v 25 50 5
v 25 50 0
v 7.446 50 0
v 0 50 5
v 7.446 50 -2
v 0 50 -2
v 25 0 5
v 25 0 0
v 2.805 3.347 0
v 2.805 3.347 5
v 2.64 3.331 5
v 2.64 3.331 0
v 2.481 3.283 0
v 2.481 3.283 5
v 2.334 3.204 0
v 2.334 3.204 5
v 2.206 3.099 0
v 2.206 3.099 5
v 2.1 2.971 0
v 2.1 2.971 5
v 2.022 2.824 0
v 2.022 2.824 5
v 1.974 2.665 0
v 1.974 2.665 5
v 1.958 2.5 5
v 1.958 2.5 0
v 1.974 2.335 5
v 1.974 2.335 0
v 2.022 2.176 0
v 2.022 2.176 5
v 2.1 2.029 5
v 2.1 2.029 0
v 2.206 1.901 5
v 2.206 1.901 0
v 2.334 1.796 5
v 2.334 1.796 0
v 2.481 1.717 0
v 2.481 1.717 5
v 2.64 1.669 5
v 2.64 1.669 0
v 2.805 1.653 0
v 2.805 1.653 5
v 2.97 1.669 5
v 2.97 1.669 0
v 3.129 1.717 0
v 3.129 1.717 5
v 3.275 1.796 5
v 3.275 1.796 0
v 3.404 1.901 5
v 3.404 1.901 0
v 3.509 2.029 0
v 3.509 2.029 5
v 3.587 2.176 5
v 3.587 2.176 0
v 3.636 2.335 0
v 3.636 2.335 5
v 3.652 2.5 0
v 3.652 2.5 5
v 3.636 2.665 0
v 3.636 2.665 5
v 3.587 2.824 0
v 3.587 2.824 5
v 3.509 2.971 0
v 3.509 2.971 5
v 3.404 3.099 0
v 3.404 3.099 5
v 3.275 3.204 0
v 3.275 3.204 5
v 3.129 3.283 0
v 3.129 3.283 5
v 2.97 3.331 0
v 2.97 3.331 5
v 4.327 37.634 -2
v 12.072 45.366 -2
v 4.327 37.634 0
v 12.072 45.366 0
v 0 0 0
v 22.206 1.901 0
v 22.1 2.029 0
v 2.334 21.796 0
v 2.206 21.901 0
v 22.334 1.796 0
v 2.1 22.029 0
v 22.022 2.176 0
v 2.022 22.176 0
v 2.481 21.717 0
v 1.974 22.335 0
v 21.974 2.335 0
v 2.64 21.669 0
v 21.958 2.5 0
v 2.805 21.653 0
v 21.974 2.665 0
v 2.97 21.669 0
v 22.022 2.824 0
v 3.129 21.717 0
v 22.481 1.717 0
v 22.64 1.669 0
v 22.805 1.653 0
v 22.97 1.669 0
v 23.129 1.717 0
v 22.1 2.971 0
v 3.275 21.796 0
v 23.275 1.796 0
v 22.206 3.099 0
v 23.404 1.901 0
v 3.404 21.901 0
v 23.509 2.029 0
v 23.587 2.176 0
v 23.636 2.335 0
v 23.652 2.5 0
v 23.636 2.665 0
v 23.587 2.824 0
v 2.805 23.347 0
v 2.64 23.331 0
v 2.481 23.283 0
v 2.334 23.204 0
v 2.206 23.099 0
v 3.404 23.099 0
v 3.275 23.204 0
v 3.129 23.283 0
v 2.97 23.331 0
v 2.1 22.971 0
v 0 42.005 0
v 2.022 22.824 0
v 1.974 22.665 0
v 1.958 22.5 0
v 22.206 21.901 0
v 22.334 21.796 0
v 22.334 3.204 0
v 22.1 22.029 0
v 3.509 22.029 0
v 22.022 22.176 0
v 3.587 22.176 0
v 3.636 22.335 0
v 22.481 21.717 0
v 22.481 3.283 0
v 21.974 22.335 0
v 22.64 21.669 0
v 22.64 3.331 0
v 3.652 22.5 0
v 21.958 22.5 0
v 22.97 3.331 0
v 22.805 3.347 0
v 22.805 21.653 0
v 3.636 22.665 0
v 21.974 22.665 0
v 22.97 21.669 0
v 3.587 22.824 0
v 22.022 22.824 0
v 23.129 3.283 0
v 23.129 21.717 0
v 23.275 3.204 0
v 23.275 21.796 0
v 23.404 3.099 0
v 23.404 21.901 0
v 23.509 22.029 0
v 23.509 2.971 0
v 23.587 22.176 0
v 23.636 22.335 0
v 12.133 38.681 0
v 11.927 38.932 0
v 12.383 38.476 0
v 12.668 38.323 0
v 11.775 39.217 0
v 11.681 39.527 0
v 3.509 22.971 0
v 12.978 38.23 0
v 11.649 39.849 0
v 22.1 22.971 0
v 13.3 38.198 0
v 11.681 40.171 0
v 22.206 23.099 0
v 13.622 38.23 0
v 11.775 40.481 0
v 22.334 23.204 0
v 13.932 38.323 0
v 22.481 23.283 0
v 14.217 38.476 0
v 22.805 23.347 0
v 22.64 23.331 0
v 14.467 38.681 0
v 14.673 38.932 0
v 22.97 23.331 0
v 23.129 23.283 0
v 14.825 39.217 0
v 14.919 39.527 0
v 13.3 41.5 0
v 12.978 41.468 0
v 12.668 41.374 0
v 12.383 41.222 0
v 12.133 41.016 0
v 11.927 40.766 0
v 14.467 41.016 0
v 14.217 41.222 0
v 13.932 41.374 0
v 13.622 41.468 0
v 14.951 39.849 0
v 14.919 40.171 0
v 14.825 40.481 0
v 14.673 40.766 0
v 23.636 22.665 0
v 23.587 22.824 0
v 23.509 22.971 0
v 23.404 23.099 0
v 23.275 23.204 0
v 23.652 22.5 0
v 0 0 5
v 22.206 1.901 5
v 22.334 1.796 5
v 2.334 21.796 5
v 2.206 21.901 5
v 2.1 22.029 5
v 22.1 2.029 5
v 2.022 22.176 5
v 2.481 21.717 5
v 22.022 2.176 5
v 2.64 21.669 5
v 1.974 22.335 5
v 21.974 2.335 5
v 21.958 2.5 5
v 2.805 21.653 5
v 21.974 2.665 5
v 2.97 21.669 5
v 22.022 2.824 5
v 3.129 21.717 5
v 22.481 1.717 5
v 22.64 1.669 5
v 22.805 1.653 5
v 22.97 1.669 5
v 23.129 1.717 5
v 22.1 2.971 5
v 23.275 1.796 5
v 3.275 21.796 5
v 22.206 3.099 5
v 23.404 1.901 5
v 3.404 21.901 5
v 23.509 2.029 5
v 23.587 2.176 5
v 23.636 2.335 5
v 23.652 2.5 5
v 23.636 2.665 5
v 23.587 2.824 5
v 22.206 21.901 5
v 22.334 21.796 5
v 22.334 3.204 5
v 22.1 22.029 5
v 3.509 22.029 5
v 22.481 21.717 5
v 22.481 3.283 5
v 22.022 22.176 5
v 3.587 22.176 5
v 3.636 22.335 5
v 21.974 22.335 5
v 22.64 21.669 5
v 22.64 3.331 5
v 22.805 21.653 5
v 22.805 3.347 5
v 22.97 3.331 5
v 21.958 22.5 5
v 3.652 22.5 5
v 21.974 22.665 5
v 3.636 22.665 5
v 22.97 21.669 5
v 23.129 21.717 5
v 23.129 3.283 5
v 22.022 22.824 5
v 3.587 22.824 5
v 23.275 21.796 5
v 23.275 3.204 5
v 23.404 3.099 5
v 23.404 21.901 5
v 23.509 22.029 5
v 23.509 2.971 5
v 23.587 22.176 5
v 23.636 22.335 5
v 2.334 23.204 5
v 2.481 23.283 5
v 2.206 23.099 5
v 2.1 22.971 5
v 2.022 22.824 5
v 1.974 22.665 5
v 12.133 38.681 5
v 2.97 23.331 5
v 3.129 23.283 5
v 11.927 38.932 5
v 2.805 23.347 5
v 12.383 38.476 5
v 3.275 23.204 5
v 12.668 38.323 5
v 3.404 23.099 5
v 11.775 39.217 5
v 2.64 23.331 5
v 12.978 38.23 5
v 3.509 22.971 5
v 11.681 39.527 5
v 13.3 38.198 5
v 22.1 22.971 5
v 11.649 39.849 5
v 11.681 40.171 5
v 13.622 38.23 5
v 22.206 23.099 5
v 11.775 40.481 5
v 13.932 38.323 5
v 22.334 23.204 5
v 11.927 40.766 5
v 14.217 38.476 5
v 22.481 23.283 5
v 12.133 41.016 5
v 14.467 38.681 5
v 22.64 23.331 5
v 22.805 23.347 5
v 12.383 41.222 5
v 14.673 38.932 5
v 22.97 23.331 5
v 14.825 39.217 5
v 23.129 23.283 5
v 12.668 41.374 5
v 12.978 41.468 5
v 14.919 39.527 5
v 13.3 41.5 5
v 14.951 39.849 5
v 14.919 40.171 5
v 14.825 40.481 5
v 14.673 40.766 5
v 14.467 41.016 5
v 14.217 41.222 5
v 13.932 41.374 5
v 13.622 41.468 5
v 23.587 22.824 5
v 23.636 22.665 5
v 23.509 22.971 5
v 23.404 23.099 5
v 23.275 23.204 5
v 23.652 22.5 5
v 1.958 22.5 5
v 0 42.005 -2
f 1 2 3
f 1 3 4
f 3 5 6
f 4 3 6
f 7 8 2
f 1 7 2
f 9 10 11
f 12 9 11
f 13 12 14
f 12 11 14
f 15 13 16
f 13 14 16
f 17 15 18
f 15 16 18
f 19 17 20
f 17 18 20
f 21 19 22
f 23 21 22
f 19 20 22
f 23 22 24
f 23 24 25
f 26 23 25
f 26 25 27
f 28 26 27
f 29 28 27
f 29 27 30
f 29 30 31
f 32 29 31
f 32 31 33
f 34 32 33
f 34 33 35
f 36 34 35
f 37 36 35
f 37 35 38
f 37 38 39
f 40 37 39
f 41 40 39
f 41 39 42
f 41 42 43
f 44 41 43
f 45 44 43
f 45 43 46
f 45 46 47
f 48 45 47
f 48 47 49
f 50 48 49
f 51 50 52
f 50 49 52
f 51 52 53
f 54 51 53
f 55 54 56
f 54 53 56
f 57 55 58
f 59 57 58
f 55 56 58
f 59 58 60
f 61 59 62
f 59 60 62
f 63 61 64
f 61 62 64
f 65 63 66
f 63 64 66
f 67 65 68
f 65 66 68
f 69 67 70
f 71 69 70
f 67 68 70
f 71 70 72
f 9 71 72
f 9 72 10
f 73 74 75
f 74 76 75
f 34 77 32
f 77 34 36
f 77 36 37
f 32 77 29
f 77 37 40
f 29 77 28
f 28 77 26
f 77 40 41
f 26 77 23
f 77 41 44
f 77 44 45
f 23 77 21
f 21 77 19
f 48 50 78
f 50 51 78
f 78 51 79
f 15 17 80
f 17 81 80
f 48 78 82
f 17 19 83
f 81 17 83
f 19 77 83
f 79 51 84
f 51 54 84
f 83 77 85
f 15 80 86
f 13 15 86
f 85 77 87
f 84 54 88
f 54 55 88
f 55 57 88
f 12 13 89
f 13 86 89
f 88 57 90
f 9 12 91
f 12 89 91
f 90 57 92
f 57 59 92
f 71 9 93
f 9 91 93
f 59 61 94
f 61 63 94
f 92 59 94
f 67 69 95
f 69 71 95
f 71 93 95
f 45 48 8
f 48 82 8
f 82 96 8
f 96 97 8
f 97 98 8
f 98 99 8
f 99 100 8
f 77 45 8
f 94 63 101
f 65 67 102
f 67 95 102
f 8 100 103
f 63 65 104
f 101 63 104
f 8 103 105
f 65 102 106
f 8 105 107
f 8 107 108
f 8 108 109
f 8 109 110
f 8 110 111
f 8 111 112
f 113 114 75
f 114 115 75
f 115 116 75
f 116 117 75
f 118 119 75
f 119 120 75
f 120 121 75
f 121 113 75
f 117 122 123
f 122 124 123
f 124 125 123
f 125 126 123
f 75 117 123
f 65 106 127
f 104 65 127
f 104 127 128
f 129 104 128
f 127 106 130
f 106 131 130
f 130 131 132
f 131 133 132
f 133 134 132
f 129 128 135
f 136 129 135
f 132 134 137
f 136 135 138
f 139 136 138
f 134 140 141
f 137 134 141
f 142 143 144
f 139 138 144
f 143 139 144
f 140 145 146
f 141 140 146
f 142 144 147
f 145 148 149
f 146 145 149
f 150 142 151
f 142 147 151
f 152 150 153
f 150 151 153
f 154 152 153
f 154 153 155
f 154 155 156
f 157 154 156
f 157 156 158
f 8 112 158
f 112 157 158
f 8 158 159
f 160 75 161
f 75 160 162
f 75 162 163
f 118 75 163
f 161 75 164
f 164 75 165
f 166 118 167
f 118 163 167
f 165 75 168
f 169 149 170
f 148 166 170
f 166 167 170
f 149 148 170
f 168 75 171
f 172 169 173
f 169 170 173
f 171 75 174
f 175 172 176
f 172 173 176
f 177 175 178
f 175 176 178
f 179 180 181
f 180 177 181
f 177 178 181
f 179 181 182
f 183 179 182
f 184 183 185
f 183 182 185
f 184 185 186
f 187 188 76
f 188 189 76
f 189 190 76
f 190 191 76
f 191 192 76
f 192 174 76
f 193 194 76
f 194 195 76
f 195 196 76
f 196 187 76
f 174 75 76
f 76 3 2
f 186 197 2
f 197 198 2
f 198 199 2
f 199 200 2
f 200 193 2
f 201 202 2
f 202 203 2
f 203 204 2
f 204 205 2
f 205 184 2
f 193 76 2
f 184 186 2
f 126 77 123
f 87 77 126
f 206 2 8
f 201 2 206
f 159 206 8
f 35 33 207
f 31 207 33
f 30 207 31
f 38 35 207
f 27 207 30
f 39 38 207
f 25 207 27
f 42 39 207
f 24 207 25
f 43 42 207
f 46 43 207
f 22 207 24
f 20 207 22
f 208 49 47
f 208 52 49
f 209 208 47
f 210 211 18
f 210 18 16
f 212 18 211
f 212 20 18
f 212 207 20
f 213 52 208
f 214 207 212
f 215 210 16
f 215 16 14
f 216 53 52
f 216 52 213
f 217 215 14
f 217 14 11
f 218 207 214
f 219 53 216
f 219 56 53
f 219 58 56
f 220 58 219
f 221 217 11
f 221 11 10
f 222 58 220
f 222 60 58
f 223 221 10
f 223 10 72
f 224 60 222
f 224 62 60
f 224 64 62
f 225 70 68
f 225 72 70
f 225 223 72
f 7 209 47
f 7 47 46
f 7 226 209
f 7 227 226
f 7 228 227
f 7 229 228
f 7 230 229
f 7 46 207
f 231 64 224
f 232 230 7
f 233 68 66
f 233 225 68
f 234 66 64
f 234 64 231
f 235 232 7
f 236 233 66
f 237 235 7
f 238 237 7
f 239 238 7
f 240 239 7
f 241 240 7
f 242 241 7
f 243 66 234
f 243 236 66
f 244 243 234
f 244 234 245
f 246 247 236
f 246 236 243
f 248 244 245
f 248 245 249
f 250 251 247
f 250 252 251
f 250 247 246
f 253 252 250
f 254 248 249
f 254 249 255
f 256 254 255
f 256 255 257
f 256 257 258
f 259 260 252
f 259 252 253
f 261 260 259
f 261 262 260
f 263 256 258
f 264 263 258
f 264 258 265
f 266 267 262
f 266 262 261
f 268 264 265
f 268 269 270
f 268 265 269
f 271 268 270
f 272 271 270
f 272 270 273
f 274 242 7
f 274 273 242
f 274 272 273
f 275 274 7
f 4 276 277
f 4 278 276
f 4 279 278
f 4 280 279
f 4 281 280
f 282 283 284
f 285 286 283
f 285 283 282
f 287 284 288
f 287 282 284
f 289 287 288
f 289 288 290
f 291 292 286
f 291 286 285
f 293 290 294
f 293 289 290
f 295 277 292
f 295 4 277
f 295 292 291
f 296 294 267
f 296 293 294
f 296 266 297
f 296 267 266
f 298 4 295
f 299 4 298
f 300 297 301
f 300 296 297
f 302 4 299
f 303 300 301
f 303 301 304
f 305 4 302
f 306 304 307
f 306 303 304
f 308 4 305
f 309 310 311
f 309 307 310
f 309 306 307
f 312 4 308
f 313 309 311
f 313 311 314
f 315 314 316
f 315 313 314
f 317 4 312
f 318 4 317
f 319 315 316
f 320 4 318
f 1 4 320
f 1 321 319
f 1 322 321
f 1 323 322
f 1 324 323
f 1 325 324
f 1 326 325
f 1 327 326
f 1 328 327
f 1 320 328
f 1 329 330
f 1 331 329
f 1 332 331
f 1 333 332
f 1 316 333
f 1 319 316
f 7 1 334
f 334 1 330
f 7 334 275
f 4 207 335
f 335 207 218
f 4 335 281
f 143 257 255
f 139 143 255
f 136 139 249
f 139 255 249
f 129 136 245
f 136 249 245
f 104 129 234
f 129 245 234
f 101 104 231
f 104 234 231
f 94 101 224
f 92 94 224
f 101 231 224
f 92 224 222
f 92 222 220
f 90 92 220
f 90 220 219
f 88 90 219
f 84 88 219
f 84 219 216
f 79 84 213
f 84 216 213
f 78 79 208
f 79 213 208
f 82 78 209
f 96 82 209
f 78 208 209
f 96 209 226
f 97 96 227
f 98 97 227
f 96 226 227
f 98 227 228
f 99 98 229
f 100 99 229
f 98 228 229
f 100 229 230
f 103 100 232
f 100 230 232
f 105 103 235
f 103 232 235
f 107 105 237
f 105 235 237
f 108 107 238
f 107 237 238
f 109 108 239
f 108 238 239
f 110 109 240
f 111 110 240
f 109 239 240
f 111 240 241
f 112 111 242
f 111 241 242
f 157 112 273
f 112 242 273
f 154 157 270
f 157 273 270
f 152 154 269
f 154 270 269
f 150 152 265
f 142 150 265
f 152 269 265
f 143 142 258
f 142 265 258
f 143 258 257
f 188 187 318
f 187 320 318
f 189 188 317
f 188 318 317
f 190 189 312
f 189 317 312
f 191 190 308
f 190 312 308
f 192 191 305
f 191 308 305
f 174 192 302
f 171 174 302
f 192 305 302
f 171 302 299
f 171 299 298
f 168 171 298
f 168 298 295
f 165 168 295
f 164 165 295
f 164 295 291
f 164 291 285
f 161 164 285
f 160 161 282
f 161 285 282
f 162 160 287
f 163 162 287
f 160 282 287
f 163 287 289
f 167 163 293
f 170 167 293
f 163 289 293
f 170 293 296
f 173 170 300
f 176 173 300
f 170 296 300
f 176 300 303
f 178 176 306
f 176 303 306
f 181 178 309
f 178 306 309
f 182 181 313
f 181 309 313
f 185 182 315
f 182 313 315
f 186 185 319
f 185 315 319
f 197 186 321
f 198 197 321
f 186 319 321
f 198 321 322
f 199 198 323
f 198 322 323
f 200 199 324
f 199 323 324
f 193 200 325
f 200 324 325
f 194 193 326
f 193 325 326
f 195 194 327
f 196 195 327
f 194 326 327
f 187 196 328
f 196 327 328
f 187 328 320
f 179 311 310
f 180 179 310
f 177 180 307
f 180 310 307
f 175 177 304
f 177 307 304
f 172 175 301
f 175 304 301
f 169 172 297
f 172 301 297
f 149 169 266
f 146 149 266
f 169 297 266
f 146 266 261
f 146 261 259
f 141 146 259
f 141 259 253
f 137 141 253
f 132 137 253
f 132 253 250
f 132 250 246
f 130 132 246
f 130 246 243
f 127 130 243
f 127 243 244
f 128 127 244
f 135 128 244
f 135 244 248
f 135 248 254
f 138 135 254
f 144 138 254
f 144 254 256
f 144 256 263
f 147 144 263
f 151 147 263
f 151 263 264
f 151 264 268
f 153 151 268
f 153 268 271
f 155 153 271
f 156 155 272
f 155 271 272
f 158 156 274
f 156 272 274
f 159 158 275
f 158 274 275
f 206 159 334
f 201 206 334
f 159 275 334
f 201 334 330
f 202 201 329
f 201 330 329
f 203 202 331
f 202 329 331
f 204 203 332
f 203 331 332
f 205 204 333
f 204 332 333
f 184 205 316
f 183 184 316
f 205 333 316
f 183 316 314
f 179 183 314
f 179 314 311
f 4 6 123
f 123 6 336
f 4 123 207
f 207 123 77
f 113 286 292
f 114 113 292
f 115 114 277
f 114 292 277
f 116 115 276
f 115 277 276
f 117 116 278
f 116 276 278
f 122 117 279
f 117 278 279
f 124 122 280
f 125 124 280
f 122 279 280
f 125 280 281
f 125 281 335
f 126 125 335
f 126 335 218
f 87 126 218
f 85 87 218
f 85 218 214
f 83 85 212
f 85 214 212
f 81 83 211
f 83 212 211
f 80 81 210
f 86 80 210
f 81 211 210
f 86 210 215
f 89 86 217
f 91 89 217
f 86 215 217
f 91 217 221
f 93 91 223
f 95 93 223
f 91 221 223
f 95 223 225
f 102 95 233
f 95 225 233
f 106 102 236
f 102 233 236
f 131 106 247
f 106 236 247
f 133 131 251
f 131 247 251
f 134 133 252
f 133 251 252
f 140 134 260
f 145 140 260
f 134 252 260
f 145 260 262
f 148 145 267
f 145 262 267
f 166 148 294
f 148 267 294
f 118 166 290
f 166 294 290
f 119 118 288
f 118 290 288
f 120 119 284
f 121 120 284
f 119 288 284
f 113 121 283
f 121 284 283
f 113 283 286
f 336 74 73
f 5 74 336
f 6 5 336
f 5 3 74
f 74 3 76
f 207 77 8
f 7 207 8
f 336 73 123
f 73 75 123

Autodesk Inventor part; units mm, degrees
ref_plane "YZ Plane" through (0, 0, 0) normal (1, 0, 0) x (0, 1, 0)
ref_plane "XZ Plane" through (0, 0, 0) normal (0, 1, 0) x (-1, 0, 0)
ref_plane "XY Plane" through (0, 0, 0) normal (0, 0, 1) x (1, 0, 0)
sketch "Sketch1" plane through (0, 0, 0) normal (0, 0, 1) x (1, 0, 0)
  line L0 (0, 0) -> (25, 0)
  line L1 (25, 0) -> (25, 50)
  line L2 (25, 50) -> (0, 50)
  line L3 (0, 50) -> (0, 0)
  dimension "d0" = 50
  dimension "d1" = 25
extrude "Extrusion1" add sketch "Sketch1" along normal blind 5
sketch "Sketch7" plane through (0, 0, 0) normal (0, 0, -1) x (-1, 0, 0)
  line L0 (0, 0) -> (-25, 0) projected
  line L1 (0, 50) -> (0, 0) projected
  line L2 (-25, 50) -> (0, 50) projected
  line L3 (-25, 0) -> (-25, 50) projected
  line L4 (-26.9321, 31.3954) -> (-26.9317, 31.395) projected
  line L5 (-6.036, 52.1675) -> (-6.0379, 52.1694) projected
  line L6 (-6.0392, 52.1707) -> (-6.0403, 52.1719) projected
  line L7 (-25, 50) -> (-17.5538, 50)
  line L8 (-9.8347, 48.3993) -> (-9.8243, 48.3993)
  line L9 (-25, 50) -> (-25, 43.2194)
  line L10 (-25, 33.3181) -> (-25, 33.3148)
  line L11 (-25, 50) -> (-25, 0)
  line L12 (-25, 0) -> (0, 0)
  line L13 (0, 0) -> (0, 50)
  line L14 (-4.3266, 37.6341) -> (0, 42.0051)
  line L15 (-7.4462, 50) -> (-12.072, 45.3663)
  line L16 (-12.072, 45.3663) -> (-4.3266, 37.6341)
  line L17 (-12.072, 45.3663) -> (-4.3266, 37.6341)
  point P0 (0, 33.3148)
  point P1 (0, 45.3321)
  point P2 (0, 37.6341)
  point P3 (-16.7135, 50)
  point P4 (0, 42.0051)
  dimension "d59" = 16.7135
  dimension "d60" = 7.4462
extrude "Extrusion3" add sketch "Sketch7" along normal blind 2 from surface at 0 contours L14 L16 L15 L2 L1
sketch "Sketch11" plane through (0, 0, 0) normal (0, 0, -1) x (-1, 0, 0)
  circle A0 centre (-13.3, 39.8488) radius 1.651
  line L0 (-25, 50) -> (-7.4462, 50) projected
  line L1 (-25, 0) -> (-25, 50) projected
  point P0 (0, 0)
  dimension "d61" = 3.302
  dimension "d62" = 10.1512
  dimension "d63" = 11.7
hole "Hole5" at (13.3, 39.8488, 0) direction (0, 0, 1) diameter 3.302 end through all thread size "8-32 UNC" class "2B" standard "ANSI Unified Screw Threads"
sketch "Sketch12" plane through (0, 0, 0) normal (0, 0, -1) x (-1, 0, 0)
  circle A0 centre (-22.8048, 22.5) radius 0.847
  line L0 (0, 0) -> (-25, 0) projected
  line L1 (-25, 0) -> (-25, 50) projected
  circle A1 centre (-22.8048, 2.5) radius 0.847
  circle A2 centre (-2.8048, 22.5) radius 0.847
  line L2 (0, 42.0051) -> (0, 0) projected
  circle A3 centre (-2.8048, 2.5) radius 0.847
  dimension "d71" = 1.694
  dimension "d72" = 22.5
  dimension "d73" = 2.1952
  dimension "d74" = 1.694
  dimension "d75" = 20
  dimension "d76" = 2.8048
  dimension "d77" = 1.694
  dimension "d78" = 1.694
hole "Hole8" at (22.8048, 22.5, 0) at (22.8048, 2.5, 0) at (2.8048, 22.5, 0) at (2.8048, 2.5, 0) direction (0, 0, 1) diameter 1.6942 end through all thread size "2-56 UNC" class "2B" standard "ANSI Unified Screw Threads"
properties part number "mirror translation stage adapter v2"
